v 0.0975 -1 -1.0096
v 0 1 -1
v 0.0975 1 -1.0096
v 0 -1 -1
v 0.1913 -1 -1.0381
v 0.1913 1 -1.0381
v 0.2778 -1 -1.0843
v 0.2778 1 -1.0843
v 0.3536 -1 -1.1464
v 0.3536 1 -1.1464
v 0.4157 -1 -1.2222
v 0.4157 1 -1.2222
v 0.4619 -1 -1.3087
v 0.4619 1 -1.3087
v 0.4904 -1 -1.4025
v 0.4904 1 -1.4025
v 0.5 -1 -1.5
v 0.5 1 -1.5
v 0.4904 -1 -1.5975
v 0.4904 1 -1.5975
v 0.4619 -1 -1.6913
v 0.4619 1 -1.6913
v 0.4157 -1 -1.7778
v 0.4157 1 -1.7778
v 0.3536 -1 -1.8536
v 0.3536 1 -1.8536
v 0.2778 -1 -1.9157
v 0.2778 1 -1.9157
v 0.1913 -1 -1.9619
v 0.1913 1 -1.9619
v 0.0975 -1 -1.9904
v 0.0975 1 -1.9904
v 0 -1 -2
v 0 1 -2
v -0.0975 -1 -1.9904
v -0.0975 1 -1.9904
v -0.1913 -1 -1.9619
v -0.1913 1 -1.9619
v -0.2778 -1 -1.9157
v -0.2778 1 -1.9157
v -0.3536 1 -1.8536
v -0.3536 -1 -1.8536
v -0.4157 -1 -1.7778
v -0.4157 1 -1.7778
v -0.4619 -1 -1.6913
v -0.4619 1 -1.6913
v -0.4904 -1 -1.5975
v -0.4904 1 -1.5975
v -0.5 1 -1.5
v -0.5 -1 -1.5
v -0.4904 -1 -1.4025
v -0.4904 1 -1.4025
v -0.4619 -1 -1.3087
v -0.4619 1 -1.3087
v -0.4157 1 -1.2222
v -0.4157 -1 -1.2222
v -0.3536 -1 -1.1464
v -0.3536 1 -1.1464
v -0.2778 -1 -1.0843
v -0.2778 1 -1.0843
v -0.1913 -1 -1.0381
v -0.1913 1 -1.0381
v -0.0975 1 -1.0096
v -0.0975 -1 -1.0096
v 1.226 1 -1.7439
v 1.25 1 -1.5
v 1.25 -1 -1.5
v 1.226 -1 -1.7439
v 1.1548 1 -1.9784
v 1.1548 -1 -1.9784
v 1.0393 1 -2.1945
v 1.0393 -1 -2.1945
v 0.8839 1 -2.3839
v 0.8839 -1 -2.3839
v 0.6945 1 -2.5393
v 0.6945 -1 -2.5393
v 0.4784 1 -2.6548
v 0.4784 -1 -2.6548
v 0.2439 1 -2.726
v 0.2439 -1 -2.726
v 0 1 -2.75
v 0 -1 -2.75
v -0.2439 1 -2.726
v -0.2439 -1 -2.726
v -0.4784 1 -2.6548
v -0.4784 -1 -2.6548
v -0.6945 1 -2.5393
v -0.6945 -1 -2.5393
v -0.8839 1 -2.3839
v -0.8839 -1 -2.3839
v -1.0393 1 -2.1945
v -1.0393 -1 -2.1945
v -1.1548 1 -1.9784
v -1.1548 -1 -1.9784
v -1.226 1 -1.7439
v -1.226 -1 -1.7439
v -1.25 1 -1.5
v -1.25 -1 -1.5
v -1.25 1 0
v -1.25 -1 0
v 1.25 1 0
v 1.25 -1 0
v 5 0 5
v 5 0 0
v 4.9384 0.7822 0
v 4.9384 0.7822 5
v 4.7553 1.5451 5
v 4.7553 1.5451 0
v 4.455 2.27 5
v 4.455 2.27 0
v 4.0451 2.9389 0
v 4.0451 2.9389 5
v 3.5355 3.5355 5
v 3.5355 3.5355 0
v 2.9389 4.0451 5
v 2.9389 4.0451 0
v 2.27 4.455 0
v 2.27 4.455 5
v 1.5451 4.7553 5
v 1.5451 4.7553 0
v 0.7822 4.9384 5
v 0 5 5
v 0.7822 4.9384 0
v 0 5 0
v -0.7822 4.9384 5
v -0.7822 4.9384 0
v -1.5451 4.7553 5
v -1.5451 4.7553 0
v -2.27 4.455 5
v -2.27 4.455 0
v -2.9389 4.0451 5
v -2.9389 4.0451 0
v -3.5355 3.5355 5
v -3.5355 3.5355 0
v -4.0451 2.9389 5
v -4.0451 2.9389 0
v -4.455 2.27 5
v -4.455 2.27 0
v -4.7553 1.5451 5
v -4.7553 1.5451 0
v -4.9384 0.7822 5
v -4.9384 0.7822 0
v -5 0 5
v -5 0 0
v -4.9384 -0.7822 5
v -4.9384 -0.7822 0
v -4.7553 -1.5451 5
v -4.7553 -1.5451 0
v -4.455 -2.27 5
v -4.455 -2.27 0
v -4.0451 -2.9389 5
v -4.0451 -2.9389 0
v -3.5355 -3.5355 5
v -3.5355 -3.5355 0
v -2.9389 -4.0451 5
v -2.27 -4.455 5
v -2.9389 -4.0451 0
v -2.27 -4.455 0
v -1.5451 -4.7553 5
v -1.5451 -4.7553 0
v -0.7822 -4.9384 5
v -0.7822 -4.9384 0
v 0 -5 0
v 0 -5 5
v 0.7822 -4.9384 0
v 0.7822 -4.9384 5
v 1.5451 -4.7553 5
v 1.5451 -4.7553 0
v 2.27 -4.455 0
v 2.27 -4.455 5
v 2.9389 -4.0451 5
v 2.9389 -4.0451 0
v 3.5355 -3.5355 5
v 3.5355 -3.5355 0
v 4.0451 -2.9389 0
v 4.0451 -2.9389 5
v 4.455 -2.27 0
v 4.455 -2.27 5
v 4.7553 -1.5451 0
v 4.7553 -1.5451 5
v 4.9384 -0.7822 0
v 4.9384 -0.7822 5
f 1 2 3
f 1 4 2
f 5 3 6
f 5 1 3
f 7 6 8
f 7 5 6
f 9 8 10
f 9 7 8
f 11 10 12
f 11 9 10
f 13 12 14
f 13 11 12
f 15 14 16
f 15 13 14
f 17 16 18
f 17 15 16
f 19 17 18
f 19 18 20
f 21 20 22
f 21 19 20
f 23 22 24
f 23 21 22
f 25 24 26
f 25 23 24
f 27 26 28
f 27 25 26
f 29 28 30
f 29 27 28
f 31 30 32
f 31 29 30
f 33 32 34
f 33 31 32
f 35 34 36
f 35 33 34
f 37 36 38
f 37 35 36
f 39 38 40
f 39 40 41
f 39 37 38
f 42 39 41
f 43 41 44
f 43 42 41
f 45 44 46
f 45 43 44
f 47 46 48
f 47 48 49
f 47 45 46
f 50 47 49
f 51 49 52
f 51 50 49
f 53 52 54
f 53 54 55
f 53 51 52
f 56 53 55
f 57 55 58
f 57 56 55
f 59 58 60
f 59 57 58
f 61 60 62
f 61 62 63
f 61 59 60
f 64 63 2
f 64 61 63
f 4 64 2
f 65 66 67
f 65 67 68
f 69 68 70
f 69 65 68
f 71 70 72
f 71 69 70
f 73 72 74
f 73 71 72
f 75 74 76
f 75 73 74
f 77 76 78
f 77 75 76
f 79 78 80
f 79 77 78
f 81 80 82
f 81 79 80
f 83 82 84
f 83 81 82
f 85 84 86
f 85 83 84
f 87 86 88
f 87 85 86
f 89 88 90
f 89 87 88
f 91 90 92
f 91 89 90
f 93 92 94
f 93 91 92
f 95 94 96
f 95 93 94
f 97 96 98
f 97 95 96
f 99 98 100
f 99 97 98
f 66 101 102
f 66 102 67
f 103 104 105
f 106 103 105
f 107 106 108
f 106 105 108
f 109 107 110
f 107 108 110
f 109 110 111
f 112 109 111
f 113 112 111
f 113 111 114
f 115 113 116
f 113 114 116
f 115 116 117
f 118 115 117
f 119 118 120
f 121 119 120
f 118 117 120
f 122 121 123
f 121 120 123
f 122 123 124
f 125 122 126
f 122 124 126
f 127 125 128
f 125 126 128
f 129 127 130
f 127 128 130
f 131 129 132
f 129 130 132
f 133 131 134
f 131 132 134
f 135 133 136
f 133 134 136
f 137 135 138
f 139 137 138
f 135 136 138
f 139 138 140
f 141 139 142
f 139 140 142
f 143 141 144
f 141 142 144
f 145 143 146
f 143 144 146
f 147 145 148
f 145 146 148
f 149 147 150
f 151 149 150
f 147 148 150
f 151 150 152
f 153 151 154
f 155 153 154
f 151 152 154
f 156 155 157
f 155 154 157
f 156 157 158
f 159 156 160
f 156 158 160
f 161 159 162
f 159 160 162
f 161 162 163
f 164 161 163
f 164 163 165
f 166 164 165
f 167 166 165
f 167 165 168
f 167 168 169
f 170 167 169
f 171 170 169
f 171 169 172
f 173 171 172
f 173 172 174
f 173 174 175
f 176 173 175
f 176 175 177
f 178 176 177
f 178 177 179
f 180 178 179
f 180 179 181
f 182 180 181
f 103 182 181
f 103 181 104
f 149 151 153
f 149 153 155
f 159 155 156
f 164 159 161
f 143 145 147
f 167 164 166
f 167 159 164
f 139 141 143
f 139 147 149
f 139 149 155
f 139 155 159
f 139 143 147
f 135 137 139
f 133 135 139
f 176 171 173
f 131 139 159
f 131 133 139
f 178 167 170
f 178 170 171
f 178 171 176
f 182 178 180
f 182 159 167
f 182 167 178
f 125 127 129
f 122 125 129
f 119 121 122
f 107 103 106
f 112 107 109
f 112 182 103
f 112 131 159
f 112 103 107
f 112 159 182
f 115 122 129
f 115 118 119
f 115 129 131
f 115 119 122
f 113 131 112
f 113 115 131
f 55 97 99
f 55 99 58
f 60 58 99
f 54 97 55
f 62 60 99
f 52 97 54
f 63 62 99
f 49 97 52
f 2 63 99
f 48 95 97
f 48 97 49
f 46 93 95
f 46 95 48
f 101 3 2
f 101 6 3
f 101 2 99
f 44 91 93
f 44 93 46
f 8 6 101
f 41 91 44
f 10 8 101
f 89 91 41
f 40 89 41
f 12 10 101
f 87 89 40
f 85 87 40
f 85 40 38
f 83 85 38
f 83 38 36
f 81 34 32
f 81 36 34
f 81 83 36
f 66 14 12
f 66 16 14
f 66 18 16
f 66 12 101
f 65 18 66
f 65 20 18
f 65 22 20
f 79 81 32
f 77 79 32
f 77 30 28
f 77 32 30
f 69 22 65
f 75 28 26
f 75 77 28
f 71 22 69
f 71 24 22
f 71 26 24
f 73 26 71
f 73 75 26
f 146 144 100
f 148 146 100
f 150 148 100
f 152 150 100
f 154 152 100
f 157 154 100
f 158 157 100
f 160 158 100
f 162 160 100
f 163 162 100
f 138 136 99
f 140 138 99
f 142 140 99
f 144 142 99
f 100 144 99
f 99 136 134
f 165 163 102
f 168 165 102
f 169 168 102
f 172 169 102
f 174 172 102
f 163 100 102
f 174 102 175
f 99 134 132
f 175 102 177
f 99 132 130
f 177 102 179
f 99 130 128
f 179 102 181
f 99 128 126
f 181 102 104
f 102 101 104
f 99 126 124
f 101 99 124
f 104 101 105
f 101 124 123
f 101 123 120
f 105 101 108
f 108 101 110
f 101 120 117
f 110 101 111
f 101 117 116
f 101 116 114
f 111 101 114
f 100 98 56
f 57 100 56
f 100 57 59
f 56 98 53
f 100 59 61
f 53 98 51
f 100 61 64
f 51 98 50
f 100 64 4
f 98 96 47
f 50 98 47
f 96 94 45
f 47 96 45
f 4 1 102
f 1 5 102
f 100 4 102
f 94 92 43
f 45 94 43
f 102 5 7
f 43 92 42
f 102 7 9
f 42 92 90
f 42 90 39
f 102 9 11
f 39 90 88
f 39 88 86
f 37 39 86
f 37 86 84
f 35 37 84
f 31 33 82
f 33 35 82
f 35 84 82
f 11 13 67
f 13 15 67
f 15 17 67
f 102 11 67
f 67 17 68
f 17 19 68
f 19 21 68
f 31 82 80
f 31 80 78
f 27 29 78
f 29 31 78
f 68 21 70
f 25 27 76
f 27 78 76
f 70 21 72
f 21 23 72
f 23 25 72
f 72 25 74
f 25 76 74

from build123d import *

# Parameters (mm, degrees)
SKETCH1_R           = 5
BOSS_EXTRUDE1_DEPTH = 5
SKETCH2_R           = 0.5
BOSS_EXTRUDE2_DEPTH = 1


with BuildPart() as part:
    # Sketch1 → Boss-Extrude1 (new body)
    with BuildSketch(Plane.XY):
        Circle(SKETCH1_R)
    extrude(amount=BOSS_EXTRUDE1_DEPTH)

    # Sketch2 → Boss-Extrude2 (add, symmetric)
    with BuildSketch(Plane(origin=(0, 0, 0), x_dir=(1, 0, 0), z_dir=(0, 1, 0))):
        with BuildLine():
            Line((-1.25, 0), (1.25, 0))
            Line((1.25, 0), (1.25, 1.5))
            ThreePointArc((1.25, 1.5), (0, 2.75), (-1.25, 1.5))
            Line((-1.25, 1.5), (-1.25, 0))
        make_face()
        with Locations(Location((0, 1.5, 0), (0, 0, 270))):
            Circle(SKETCH2_R, mode=Mode.SUBTRACT)
    extrude(amount=BOSS_EXTRUDE2_DEPTH, both=True)


solid = part.part
